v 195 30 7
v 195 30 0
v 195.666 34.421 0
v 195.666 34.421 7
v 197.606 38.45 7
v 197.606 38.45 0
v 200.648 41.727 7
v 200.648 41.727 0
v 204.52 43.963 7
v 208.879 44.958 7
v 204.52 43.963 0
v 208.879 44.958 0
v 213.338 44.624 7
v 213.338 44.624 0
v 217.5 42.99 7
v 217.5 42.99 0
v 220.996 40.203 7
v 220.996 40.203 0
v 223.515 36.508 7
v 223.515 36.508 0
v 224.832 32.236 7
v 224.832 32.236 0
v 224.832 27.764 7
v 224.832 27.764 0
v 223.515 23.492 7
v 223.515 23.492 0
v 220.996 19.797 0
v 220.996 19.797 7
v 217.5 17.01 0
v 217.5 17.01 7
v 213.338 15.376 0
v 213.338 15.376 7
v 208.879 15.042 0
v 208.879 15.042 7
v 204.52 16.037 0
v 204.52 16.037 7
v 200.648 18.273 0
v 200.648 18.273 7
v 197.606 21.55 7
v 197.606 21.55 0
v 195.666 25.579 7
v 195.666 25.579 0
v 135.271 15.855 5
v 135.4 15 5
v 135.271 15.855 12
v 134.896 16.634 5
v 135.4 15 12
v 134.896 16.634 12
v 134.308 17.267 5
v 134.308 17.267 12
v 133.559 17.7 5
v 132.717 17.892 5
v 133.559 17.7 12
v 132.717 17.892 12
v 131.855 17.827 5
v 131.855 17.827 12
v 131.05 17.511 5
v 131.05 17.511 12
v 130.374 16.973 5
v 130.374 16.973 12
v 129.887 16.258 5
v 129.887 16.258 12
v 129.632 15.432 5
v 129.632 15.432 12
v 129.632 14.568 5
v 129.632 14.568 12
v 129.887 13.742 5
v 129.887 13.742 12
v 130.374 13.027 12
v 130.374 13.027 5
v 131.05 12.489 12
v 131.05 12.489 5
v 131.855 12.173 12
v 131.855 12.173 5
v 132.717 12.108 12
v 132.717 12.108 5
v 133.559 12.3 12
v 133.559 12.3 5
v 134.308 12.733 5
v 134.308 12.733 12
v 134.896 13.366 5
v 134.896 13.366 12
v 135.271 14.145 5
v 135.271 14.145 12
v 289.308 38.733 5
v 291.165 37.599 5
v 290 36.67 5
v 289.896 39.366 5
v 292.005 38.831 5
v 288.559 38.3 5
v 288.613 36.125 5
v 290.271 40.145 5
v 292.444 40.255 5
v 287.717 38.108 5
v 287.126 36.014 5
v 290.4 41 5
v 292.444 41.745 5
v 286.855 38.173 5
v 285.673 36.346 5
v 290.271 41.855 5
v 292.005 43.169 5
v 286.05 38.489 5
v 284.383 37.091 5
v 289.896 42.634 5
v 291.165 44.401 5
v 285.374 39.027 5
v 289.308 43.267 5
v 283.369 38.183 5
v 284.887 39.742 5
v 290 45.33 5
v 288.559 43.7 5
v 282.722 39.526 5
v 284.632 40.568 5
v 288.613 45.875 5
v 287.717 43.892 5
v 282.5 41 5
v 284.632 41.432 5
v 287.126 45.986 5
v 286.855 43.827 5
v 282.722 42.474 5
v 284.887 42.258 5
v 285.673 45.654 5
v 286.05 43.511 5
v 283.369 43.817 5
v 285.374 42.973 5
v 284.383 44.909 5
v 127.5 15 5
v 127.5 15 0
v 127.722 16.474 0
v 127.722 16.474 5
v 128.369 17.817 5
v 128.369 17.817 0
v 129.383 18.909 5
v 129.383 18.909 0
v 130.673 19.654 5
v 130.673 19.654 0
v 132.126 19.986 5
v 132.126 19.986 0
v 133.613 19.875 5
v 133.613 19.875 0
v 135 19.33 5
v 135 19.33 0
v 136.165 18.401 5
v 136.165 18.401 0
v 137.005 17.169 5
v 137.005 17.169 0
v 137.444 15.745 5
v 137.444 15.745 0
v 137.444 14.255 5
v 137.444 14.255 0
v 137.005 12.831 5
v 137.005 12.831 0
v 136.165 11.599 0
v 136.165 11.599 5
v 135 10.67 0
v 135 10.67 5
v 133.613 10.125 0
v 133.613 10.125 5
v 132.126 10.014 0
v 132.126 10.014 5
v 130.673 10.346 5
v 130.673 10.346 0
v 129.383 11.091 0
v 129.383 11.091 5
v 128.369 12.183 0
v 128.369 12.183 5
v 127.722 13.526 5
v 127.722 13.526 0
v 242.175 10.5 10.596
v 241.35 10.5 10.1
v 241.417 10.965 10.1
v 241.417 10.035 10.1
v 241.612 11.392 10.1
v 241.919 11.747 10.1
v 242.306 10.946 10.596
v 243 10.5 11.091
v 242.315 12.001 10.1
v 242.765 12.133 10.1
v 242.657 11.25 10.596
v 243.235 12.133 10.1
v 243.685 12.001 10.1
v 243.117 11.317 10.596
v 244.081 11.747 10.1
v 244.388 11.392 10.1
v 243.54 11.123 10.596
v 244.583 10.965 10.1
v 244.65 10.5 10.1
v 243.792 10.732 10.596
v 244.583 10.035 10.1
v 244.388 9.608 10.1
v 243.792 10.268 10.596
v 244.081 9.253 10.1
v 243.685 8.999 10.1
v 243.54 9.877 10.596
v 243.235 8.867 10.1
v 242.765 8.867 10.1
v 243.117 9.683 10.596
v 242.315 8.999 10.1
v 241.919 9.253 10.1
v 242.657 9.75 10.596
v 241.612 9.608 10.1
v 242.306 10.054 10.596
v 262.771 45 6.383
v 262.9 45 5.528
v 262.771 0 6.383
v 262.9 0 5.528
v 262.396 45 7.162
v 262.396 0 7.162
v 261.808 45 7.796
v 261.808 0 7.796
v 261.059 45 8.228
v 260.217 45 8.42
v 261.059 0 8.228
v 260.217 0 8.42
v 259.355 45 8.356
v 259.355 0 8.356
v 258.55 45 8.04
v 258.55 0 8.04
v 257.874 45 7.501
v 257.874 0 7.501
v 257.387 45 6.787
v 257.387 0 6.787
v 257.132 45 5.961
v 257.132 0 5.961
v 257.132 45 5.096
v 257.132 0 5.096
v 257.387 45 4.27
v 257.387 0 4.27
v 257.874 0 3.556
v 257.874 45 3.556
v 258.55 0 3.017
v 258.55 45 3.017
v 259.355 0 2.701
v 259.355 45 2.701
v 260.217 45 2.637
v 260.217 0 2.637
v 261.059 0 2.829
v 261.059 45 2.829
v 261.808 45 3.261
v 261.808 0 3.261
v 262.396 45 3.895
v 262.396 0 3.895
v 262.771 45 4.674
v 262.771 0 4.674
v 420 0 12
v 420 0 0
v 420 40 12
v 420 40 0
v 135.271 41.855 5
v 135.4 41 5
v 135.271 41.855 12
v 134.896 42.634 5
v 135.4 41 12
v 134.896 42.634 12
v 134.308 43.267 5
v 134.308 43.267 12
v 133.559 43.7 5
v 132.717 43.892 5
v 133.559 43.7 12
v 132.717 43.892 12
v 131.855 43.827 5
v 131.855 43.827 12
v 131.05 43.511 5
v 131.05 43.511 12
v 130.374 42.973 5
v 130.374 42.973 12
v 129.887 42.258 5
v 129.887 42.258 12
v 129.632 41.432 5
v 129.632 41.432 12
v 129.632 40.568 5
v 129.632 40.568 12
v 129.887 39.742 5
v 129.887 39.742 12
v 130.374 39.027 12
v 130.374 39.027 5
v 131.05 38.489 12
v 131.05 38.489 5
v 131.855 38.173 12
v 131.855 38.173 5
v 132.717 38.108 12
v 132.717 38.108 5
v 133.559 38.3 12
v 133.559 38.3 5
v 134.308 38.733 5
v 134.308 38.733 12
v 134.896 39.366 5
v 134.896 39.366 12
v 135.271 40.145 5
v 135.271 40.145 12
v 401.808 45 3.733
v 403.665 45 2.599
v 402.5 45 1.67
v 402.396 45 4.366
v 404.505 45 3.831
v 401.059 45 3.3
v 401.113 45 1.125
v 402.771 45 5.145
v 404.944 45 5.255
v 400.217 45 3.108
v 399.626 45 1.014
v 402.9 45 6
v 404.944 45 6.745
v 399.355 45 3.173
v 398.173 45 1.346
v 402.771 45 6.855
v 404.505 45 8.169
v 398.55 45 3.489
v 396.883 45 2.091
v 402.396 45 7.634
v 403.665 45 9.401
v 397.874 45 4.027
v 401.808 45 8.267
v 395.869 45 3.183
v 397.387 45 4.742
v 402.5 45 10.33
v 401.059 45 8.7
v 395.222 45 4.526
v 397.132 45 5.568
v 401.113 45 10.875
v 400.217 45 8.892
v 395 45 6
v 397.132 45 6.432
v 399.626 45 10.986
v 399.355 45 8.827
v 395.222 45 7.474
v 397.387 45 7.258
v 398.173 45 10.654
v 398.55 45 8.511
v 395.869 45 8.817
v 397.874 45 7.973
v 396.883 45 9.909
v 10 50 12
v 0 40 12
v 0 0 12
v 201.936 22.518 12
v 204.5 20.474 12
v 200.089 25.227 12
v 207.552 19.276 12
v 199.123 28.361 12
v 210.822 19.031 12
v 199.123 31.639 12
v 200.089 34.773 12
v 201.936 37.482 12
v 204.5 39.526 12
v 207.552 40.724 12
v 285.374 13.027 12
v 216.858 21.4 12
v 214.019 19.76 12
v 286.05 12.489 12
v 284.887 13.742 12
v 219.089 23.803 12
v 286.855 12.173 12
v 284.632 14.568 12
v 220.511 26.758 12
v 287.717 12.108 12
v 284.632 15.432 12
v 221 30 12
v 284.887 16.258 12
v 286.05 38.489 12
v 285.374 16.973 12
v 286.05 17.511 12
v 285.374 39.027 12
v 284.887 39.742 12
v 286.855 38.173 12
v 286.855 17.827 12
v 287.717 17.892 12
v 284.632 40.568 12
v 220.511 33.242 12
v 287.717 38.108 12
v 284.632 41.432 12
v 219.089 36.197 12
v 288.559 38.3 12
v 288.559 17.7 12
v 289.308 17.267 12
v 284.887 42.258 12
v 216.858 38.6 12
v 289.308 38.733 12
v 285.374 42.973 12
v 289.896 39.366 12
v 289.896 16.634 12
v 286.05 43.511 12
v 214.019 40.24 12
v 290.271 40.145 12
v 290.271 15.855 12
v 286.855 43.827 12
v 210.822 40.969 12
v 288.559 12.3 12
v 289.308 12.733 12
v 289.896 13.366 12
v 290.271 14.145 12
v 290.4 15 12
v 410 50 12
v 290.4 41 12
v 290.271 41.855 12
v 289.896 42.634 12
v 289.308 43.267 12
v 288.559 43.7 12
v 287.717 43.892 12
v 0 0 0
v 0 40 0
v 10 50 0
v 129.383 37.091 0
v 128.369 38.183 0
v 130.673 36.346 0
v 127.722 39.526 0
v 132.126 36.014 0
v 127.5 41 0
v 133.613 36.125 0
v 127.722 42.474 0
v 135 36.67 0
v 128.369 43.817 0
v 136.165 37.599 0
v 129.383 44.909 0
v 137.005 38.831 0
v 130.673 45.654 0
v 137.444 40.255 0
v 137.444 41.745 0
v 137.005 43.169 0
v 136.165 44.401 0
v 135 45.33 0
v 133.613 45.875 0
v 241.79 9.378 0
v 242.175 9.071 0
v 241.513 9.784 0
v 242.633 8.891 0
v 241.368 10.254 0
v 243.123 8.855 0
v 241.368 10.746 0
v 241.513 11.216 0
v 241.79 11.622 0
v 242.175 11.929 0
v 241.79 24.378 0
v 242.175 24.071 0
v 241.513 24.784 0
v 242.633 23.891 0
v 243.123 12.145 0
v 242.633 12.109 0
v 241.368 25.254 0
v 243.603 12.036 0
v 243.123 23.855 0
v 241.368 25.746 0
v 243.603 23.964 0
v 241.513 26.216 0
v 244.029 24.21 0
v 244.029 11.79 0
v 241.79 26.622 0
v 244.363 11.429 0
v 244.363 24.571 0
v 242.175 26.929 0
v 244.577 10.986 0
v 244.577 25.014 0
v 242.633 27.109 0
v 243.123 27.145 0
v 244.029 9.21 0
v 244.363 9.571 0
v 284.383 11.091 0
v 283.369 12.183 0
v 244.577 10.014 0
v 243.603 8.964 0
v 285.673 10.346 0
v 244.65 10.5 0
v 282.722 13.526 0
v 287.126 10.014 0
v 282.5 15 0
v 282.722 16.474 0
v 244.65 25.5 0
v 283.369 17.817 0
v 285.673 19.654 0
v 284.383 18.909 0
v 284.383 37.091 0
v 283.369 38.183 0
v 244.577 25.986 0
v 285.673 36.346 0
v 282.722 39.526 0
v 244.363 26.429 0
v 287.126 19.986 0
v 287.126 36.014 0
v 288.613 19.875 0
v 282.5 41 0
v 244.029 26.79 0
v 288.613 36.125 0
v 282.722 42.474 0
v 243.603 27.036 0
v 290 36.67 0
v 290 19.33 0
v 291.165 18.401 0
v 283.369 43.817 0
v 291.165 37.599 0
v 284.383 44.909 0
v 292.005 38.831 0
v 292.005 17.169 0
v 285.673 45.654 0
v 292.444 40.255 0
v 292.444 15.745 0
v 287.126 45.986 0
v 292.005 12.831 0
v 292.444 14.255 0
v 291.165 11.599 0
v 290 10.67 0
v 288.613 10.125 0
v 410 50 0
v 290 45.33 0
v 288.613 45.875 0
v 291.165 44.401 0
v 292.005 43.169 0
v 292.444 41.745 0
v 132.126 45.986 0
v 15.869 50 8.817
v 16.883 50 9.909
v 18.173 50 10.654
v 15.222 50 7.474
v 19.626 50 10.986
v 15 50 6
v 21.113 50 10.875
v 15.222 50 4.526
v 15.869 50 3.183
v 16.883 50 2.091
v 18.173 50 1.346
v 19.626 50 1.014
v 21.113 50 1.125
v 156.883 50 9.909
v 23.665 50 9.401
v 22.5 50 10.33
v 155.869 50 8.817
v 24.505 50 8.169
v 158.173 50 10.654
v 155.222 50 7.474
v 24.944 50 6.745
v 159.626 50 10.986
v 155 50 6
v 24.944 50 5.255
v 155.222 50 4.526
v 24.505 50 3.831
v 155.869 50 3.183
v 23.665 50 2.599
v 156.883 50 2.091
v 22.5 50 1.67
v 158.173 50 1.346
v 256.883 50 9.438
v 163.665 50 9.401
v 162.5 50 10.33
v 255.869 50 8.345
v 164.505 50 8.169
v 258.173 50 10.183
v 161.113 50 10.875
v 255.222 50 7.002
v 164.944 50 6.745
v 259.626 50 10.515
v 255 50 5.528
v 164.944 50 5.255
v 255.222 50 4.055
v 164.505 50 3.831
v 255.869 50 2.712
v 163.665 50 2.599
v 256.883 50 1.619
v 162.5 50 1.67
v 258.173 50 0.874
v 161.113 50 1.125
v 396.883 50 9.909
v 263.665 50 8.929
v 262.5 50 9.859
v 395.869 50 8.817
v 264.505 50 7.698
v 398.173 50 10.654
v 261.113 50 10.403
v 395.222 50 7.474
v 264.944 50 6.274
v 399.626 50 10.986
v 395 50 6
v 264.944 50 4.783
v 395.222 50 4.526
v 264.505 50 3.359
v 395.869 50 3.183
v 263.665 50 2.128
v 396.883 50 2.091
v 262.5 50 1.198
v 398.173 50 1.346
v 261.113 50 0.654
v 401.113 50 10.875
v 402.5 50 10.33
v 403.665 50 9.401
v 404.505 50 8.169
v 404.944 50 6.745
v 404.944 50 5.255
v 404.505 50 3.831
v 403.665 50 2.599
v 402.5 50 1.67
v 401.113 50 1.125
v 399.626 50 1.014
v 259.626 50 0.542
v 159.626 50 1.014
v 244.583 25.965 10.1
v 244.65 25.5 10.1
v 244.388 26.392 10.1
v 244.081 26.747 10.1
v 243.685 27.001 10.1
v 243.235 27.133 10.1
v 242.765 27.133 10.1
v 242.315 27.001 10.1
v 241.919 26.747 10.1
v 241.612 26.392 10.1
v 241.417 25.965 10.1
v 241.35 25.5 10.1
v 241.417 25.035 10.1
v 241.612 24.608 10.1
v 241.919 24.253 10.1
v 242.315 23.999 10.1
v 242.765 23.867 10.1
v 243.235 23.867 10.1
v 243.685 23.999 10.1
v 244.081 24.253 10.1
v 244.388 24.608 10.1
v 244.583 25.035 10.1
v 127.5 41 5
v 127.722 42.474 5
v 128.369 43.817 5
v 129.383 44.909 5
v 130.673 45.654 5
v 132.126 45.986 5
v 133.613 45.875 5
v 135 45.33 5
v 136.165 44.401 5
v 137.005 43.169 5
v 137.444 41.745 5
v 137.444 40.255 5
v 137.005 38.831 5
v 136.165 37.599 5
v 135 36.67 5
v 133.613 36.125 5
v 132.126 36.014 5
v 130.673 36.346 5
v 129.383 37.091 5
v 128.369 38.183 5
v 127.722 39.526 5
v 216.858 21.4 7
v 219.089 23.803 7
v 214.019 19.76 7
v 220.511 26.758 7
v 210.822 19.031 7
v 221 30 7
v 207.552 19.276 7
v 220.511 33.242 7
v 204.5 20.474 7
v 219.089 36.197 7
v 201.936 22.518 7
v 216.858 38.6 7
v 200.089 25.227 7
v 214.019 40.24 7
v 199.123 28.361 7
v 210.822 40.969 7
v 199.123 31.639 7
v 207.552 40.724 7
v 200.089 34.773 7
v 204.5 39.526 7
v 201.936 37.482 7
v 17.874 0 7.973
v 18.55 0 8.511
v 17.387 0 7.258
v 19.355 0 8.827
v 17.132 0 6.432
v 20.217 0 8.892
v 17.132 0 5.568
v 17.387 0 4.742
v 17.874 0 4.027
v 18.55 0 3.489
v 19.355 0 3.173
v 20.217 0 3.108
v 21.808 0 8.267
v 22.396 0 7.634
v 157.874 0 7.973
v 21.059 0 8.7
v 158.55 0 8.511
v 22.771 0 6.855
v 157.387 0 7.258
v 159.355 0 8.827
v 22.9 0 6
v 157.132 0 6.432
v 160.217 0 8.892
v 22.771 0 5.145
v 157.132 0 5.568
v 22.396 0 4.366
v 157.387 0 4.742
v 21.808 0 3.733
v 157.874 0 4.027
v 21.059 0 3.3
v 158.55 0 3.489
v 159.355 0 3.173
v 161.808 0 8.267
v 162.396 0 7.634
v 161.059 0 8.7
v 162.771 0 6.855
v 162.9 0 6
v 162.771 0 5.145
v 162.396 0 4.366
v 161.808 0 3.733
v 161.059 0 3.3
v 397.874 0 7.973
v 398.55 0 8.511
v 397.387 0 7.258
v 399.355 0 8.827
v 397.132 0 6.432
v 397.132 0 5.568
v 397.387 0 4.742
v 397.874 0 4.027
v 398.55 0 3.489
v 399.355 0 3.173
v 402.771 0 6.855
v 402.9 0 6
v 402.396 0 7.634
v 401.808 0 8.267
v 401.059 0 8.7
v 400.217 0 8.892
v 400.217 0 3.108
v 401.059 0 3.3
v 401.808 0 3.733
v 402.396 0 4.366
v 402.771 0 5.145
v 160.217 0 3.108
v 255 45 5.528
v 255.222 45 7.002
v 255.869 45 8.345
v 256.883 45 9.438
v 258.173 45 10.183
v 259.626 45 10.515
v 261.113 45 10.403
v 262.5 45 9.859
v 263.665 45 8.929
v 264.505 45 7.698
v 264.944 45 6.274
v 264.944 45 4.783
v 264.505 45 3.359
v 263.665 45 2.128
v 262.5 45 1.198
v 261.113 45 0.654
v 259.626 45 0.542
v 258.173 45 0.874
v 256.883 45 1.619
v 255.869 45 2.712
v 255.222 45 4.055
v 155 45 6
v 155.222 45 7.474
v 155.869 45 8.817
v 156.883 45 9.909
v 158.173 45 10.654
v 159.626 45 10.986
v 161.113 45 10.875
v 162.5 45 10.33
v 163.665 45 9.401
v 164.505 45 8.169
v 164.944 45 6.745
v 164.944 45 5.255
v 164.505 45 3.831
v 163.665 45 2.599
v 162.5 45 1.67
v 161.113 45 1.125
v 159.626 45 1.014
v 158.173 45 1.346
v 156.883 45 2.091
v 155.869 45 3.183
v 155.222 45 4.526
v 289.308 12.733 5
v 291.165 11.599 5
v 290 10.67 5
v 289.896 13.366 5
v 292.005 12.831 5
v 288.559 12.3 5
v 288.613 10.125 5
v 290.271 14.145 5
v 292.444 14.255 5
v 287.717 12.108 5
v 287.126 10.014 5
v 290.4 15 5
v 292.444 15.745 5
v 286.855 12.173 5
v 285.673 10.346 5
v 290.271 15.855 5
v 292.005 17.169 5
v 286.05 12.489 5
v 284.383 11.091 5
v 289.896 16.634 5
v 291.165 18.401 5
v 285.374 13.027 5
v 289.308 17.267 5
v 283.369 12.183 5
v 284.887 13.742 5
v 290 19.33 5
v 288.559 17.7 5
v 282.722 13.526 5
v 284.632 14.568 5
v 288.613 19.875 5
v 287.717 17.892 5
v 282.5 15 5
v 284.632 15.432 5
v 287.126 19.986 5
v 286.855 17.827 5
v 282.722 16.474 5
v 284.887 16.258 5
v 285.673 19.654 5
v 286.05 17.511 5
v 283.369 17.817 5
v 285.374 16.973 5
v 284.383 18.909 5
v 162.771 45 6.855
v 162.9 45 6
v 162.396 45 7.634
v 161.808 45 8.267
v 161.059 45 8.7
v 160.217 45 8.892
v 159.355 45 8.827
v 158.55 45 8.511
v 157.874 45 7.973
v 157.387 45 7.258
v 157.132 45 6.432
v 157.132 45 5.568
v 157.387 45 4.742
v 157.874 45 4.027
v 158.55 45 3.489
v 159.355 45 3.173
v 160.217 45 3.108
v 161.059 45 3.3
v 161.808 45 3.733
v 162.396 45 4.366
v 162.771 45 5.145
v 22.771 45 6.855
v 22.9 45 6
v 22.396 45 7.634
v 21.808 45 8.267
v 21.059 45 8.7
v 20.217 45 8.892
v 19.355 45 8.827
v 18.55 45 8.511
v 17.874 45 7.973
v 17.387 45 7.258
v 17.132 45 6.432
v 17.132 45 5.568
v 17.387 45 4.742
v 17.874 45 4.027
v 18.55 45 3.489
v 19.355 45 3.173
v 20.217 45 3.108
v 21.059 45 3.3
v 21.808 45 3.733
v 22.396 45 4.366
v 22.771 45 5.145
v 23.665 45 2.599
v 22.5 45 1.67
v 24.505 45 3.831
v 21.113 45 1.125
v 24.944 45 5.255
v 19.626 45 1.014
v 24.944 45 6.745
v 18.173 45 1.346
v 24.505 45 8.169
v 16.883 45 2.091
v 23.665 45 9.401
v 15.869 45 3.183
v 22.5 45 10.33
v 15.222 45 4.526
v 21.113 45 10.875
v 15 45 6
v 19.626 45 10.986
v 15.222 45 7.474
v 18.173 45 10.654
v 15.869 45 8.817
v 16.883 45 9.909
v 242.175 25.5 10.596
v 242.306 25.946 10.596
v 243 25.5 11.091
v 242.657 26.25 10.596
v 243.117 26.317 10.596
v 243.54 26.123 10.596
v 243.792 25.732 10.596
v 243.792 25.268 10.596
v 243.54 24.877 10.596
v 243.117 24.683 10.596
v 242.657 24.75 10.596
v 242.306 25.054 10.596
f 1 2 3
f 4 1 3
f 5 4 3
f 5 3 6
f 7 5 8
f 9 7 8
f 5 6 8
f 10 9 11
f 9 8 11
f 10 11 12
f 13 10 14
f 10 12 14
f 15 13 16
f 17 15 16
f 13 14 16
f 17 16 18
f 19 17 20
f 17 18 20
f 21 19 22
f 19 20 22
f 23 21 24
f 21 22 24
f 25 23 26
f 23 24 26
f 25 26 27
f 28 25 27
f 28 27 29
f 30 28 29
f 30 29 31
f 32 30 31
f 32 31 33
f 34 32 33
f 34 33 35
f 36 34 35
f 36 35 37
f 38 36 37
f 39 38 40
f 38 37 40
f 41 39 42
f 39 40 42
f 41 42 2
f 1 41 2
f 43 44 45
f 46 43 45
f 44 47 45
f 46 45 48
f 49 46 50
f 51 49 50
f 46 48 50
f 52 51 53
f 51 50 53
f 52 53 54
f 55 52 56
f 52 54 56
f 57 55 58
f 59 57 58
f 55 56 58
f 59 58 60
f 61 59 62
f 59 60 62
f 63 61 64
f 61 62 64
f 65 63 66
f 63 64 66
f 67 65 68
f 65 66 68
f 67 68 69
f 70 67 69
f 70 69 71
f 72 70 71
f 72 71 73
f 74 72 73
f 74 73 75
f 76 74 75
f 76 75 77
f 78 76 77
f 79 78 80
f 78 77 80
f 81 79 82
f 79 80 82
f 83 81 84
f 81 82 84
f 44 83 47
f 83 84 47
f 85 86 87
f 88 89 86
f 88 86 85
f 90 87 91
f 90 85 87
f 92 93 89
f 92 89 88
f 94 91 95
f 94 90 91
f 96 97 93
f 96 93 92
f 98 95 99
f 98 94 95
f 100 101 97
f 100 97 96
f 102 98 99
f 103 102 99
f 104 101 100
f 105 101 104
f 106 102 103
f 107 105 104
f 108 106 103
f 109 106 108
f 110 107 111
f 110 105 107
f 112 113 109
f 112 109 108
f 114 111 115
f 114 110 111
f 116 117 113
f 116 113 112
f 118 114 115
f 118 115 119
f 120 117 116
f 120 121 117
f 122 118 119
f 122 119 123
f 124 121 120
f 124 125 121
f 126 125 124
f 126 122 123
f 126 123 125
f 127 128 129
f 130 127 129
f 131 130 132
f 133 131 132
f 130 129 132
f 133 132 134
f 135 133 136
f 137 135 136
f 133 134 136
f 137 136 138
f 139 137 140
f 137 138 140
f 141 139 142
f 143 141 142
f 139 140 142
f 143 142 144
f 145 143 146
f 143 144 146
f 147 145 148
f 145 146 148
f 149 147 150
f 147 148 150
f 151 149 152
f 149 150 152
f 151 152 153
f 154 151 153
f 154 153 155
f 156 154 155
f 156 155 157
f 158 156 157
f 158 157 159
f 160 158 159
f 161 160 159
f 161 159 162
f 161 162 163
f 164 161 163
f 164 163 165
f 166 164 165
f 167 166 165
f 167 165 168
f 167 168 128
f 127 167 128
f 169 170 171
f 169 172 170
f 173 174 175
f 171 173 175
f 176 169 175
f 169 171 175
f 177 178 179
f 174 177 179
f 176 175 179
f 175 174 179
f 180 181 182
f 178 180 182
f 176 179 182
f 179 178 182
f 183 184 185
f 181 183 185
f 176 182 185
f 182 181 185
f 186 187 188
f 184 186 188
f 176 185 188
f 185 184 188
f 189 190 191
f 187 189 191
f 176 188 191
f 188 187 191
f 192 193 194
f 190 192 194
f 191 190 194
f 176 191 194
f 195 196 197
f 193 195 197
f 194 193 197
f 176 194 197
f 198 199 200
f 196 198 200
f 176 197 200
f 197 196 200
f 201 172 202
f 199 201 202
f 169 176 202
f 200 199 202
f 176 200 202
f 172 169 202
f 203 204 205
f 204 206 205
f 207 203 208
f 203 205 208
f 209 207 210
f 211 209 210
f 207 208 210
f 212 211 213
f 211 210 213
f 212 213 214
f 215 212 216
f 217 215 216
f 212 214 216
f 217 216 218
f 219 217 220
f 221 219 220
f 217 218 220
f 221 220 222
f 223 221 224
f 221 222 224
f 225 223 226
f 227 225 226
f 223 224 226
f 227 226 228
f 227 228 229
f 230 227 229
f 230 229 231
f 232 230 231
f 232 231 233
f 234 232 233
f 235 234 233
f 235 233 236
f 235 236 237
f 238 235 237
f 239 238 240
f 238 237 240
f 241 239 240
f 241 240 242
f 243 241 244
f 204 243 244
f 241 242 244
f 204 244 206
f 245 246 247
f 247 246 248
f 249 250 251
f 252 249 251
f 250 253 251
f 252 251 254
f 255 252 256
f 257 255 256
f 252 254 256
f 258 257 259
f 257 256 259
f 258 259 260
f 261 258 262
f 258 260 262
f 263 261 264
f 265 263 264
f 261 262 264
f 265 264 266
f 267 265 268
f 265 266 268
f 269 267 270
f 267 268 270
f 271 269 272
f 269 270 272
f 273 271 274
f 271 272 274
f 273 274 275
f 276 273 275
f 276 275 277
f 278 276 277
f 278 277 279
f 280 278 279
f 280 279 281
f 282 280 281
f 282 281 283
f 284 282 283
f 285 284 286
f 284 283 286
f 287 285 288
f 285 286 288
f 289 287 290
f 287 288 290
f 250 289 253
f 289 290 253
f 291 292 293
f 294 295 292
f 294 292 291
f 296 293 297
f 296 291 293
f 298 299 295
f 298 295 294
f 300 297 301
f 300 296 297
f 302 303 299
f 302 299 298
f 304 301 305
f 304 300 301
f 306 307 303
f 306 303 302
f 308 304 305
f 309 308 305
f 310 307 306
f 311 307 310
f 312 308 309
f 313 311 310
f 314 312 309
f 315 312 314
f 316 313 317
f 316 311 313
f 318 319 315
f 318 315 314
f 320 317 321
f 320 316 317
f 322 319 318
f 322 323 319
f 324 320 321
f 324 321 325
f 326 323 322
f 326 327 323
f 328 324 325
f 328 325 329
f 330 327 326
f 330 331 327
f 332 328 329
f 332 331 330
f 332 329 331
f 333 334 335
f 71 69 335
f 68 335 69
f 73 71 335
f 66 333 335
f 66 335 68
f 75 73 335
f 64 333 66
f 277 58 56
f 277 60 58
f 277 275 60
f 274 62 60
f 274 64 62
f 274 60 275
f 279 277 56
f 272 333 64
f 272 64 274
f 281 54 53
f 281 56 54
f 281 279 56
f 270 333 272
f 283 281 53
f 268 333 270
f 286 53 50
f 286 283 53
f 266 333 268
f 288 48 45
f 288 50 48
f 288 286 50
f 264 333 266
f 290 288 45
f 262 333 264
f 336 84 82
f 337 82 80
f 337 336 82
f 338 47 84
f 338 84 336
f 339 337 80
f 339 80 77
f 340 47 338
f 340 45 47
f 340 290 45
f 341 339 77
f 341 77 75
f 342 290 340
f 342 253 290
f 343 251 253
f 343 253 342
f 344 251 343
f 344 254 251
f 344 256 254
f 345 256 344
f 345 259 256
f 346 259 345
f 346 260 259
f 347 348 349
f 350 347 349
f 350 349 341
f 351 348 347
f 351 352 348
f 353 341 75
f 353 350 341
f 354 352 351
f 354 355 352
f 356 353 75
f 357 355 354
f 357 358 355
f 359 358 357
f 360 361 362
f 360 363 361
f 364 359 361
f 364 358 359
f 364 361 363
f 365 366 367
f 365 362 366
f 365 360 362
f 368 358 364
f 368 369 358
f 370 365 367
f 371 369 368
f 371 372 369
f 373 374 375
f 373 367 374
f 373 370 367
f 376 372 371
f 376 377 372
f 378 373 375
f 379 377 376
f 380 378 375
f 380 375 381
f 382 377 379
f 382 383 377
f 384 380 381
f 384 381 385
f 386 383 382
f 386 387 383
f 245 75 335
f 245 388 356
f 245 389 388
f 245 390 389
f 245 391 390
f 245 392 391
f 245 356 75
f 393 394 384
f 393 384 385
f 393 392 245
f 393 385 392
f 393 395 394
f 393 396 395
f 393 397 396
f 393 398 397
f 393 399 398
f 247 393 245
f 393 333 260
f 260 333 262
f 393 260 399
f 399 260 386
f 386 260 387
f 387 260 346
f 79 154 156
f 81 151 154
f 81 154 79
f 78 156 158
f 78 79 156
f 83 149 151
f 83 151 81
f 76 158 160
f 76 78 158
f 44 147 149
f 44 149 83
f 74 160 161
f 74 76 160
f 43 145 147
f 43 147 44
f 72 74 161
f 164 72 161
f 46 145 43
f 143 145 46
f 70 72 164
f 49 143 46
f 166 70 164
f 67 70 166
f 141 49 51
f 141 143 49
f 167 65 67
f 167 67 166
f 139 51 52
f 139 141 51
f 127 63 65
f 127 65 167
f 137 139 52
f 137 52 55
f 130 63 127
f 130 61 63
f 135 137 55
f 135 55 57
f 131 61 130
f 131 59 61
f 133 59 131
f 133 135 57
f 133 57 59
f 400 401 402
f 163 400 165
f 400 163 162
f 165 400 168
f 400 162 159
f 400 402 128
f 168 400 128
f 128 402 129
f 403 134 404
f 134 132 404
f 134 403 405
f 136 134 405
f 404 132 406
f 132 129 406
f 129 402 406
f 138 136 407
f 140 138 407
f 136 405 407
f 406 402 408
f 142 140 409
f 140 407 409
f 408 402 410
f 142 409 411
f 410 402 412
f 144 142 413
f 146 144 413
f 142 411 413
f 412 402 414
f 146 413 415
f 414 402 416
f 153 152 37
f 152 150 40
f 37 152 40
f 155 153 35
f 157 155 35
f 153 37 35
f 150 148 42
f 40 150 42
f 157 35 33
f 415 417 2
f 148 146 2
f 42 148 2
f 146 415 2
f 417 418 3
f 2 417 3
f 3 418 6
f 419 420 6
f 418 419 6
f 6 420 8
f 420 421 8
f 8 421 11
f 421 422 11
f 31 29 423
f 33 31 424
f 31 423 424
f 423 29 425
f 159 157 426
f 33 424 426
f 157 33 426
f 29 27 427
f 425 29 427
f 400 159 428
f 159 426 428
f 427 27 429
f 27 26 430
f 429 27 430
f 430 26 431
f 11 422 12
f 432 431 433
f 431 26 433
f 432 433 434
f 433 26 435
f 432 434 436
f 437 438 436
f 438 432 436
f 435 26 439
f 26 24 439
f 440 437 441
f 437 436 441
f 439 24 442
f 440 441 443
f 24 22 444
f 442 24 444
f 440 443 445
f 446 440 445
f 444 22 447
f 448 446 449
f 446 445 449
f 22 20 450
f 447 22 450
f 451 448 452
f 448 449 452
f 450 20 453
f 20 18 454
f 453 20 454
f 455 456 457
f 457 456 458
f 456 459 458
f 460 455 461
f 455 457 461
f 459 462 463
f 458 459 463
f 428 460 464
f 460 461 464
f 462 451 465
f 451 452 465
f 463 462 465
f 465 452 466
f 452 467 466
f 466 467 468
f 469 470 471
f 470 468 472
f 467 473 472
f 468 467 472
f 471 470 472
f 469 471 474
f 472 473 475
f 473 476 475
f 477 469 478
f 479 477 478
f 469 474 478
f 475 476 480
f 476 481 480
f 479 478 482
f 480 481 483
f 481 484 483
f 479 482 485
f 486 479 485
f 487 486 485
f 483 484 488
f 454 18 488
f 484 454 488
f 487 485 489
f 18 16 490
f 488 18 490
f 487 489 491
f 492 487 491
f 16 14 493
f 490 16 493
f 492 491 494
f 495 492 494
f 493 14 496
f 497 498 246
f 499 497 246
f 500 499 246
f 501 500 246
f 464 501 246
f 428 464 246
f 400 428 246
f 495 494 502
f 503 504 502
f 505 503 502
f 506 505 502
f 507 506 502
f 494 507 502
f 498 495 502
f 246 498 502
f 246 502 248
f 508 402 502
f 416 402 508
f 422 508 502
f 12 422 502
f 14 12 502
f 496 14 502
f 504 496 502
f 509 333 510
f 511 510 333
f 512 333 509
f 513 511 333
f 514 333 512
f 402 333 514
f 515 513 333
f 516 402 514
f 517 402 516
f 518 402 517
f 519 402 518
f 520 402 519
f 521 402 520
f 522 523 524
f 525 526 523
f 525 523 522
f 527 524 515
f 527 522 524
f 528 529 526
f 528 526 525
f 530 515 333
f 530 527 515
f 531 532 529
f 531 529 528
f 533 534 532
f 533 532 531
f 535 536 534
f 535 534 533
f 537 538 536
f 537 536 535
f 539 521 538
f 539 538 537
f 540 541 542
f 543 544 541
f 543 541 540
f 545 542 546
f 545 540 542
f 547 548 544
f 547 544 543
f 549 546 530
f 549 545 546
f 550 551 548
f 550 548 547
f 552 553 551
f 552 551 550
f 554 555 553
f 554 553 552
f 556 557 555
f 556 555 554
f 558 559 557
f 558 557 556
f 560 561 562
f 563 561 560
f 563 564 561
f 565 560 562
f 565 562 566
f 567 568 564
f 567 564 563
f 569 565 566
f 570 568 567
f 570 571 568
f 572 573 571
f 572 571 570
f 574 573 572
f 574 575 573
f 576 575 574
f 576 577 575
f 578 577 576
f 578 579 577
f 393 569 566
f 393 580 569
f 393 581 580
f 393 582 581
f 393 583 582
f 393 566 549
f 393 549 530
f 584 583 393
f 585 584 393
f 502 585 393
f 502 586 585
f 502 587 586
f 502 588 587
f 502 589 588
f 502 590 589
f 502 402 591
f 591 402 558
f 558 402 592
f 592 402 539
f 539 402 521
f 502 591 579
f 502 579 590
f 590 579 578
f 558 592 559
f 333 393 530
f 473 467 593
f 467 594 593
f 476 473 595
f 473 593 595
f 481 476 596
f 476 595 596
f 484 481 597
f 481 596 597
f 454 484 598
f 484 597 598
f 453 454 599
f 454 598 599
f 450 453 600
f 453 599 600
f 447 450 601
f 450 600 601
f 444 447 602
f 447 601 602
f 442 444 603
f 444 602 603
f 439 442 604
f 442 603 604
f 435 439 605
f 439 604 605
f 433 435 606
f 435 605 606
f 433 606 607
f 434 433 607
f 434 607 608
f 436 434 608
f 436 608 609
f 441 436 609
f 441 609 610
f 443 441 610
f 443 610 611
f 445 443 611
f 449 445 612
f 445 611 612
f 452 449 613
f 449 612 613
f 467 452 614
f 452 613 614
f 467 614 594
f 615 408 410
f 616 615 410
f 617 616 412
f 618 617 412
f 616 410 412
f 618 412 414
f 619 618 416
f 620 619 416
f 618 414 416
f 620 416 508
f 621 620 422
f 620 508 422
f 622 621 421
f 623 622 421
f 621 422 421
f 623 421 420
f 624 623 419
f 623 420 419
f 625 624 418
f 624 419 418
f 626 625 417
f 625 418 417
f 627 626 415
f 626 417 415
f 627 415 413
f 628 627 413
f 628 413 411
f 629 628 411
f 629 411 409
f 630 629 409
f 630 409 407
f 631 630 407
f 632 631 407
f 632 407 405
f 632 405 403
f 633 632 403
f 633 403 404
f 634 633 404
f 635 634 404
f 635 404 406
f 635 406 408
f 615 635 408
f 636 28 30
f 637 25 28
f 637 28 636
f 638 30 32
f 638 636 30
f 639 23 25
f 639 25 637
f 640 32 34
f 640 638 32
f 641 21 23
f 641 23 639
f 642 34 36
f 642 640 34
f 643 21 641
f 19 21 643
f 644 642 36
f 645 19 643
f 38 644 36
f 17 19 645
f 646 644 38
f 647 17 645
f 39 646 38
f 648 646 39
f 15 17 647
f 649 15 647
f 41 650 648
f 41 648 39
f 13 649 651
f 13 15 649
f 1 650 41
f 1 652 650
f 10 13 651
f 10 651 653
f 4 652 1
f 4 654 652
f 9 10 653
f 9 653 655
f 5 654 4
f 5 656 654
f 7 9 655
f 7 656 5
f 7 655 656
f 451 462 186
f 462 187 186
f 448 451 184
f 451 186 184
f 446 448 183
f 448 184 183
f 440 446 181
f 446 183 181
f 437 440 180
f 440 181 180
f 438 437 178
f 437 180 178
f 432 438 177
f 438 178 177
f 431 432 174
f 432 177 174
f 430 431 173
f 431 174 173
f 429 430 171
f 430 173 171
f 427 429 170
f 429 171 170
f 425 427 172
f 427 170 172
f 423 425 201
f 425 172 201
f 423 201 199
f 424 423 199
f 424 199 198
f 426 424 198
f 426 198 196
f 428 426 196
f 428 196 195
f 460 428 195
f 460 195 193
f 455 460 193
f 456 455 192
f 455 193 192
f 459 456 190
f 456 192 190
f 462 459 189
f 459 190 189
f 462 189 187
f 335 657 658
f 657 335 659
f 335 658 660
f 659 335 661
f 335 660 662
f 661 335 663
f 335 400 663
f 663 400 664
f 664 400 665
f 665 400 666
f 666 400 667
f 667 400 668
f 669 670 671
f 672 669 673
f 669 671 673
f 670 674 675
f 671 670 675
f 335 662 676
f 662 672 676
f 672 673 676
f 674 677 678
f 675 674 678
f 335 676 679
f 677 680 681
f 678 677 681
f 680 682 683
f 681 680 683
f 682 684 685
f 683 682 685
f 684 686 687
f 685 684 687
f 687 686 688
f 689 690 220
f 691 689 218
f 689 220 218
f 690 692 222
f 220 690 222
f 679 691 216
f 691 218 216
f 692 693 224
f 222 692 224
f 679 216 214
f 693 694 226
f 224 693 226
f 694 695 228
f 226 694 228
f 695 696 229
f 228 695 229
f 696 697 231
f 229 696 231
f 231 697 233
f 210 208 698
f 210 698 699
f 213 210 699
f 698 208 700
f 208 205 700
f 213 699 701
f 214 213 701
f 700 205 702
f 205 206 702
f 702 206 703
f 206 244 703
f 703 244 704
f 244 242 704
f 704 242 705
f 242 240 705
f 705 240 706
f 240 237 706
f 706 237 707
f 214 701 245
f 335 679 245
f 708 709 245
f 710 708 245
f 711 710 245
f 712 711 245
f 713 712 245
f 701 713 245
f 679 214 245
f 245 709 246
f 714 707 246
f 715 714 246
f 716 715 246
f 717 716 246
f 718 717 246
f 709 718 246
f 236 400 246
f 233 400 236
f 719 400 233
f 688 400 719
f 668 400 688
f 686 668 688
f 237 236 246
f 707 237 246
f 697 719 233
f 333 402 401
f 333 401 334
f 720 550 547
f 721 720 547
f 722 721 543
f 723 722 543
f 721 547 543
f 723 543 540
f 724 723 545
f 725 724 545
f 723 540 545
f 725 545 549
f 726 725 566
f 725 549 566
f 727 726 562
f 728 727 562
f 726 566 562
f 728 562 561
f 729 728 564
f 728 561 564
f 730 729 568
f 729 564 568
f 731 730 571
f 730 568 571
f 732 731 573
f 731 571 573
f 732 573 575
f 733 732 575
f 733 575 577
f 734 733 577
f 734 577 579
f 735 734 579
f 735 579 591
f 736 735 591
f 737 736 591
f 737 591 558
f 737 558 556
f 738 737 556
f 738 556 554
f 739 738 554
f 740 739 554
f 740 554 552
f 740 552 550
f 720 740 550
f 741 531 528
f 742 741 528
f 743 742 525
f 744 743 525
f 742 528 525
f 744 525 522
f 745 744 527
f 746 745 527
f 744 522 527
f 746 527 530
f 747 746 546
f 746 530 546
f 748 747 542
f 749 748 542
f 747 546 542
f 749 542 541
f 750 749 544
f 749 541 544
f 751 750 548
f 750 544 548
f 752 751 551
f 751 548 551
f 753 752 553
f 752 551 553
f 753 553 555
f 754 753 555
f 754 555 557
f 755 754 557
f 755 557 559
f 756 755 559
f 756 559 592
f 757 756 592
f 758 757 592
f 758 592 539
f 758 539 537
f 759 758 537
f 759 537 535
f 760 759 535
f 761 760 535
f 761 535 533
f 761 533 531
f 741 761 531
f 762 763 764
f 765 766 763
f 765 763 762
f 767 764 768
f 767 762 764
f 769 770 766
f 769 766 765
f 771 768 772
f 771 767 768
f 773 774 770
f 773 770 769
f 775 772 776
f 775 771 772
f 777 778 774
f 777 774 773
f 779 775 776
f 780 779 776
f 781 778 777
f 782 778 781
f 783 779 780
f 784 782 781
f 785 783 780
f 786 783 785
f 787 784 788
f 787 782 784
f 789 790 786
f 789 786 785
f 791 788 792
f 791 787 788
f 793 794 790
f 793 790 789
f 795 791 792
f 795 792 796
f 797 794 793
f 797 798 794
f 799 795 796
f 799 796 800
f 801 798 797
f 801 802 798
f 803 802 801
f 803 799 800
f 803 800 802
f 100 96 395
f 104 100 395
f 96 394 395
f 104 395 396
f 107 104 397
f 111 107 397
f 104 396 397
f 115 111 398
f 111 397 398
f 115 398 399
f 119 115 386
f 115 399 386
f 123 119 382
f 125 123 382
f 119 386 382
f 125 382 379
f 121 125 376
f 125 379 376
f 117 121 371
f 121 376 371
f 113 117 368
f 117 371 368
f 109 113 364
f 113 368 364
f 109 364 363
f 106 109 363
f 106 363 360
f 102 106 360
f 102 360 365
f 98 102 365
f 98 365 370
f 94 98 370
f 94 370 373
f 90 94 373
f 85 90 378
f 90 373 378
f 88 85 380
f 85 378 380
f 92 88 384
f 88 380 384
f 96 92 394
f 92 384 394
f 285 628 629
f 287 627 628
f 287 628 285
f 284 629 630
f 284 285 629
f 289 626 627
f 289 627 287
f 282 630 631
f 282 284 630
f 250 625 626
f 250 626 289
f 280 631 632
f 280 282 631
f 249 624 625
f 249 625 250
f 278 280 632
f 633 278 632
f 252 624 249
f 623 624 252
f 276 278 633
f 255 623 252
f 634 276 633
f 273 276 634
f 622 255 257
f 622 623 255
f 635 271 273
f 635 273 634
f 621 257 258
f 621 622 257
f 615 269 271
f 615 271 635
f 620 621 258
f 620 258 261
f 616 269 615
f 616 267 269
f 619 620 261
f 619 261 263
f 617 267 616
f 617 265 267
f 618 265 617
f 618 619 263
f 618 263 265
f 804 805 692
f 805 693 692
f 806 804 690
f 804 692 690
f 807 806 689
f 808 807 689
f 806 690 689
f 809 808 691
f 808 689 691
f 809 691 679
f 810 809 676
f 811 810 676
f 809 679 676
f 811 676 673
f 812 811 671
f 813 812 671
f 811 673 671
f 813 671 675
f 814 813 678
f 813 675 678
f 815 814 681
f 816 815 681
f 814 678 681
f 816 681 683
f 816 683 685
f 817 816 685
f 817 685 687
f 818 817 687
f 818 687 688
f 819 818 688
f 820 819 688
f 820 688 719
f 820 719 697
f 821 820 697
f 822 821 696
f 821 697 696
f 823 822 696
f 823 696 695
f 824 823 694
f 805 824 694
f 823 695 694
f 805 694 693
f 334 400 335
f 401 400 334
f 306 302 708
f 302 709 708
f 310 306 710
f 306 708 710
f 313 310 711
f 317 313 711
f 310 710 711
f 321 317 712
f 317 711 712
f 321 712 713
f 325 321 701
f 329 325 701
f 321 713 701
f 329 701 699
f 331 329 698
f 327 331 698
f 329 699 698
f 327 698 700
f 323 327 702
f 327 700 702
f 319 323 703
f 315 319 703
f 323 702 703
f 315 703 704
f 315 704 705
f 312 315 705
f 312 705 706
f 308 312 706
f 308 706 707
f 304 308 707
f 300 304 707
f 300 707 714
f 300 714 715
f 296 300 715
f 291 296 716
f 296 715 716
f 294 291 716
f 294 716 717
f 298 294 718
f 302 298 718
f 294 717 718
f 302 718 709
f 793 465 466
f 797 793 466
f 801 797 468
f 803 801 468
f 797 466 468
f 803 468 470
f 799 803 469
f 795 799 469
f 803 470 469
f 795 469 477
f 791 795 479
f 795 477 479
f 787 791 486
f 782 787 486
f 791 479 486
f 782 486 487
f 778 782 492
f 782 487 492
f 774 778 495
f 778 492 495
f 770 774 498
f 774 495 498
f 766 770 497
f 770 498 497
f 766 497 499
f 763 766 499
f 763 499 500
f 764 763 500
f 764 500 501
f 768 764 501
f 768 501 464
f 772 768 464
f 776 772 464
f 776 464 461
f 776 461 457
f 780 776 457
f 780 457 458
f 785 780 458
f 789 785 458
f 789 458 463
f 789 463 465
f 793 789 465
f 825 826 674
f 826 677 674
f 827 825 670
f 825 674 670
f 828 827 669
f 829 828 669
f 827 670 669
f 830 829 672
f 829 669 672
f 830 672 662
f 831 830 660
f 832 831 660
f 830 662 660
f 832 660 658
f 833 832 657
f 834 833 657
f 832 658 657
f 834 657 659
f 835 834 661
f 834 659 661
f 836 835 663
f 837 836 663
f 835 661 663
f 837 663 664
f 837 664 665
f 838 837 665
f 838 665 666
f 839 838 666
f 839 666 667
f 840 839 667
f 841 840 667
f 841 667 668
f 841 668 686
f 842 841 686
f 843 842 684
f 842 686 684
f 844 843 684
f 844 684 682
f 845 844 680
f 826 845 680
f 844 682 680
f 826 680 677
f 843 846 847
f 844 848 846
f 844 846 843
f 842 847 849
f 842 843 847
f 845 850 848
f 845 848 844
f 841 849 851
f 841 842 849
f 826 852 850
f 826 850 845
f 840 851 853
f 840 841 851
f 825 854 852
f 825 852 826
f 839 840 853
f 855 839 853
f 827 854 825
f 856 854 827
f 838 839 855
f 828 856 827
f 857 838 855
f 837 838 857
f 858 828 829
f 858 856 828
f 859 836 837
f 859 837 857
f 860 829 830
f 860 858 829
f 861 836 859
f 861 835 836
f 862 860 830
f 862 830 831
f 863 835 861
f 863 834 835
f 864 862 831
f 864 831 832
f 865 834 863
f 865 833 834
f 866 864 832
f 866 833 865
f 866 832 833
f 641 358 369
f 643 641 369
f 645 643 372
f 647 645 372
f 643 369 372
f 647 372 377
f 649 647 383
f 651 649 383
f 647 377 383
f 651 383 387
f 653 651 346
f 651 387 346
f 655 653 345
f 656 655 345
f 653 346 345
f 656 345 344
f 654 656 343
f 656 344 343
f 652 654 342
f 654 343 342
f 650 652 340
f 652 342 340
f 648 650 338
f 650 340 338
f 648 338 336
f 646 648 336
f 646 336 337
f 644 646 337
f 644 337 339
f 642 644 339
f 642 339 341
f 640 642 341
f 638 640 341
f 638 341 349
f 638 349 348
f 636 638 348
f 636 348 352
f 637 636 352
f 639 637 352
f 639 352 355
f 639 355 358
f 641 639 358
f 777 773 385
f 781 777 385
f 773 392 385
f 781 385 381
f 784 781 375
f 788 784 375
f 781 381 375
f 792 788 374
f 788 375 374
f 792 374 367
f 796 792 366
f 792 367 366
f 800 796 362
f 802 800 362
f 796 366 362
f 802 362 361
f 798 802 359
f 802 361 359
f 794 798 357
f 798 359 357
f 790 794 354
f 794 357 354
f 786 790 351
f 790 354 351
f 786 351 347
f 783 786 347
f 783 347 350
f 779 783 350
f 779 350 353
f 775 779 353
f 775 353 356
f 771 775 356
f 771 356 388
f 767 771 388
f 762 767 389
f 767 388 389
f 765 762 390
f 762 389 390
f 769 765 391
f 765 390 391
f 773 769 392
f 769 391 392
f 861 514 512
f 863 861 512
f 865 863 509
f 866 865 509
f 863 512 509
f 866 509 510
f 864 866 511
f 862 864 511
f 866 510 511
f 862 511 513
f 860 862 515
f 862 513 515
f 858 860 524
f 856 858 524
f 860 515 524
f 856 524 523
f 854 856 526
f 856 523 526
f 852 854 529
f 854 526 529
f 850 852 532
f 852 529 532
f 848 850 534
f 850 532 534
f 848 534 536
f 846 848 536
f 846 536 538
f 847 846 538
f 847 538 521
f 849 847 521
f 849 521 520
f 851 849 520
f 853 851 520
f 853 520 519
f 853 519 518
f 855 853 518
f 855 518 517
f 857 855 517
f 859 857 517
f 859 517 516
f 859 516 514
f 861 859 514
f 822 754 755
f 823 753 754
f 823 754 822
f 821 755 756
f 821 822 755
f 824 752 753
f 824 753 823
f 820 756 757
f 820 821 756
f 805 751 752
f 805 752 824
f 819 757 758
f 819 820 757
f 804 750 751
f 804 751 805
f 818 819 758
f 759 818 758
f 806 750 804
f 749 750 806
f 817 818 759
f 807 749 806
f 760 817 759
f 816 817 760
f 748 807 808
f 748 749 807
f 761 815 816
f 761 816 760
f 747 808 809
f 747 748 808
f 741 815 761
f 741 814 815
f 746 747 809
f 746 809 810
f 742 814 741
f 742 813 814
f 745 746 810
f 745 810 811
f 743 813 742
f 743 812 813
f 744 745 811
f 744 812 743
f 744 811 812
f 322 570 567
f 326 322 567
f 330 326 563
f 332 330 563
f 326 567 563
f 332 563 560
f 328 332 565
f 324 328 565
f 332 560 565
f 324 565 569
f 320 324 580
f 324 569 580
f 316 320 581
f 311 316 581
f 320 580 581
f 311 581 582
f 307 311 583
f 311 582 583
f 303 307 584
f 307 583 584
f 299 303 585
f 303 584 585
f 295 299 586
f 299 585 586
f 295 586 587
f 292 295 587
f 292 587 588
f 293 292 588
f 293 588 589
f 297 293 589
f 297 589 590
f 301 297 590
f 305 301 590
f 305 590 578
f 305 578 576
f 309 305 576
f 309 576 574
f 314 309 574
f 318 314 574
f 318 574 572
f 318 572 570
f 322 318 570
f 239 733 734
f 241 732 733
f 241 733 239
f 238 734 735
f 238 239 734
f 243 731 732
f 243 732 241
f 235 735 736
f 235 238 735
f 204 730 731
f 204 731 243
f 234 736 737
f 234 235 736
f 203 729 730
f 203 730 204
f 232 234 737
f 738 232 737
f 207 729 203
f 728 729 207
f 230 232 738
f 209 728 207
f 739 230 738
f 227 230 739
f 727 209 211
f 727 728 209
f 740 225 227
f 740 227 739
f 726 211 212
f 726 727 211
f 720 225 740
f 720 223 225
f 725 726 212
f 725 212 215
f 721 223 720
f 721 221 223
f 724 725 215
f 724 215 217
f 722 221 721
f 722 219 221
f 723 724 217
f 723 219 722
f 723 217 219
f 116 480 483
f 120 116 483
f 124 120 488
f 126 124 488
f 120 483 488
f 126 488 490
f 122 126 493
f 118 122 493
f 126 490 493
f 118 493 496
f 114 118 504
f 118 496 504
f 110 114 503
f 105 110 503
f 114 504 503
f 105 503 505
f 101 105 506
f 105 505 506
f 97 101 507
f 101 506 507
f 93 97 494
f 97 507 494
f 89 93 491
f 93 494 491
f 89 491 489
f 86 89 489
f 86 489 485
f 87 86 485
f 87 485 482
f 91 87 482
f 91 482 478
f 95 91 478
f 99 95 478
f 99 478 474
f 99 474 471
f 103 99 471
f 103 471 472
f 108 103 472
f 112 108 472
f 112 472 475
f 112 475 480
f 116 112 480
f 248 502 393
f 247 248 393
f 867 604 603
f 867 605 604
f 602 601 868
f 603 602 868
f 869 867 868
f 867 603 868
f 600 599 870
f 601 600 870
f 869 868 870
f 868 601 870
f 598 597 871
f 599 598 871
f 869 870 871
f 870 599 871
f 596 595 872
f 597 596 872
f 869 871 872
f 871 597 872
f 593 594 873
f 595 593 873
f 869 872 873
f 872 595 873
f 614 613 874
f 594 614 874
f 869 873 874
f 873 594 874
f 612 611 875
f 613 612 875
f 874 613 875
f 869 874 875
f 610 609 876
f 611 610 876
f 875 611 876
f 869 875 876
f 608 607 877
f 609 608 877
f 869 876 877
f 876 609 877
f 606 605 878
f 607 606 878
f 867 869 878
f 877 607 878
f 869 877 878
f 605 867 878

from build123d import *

# Parameters (mm, degrees)
SKETCH_1_W                   = 420
SKETCH_1_H                   = 50
EXTRUDE_1_DEPTH              = 12
CHAMFER_1_SIZE               = 10
SKETCH_2_R                   = 11
CUT_EXTRUDE_1_DEPTH          = 424.135911972
SKETCH_3_R                   = 15
CUT_EXTRUDE_2_DEPTH          = 7
HOLE_WIZARD_M5_1_D           = 5.8
HOLE_WIZARD_M5_1_CBORE_D     = 10
HOLE_WIZARD_M5_1_CBORE_DEPTH = 5
HOLE_WIZARD_M5_2_D           = 5.8
HOLE_WIZARD_M5_2_CBORE_D     = 10
HOLE_WIZARD_M5_2_CBORE_DEPTH = 5
HOLE_WIZARD_M4_1_D           = 3.3
HOLE_WIZARD_M4_1_DEPTH       = 10.1
HOLE_WIZARD_M4_1_TIP         = 0.991420021


with BuildPart() as part:
    # 草图1 → 凸台-拉伸1 (new body)
    with BuildSketch(Plane.XY):
        with Locations((210, 25)):
            Rectangle(SKETCH_1_W, SKETCH_1_H)
    extrude(amount=EXTRUDE_1_DEPTH)

    # 倒角1
    chamfer_1_edges = [part.edges().sort_by_distance(p)[0] for p in [
        (0, 50, 6),
        (420, 50, 6),
    ]]
    chamfer(chamfer_1_edges, length=CHAMFER_1_SIZE)

    # 草图2 → 切除-拉伸1 (cut, through all)
    with BuildSketch(Plane.XY.offset(12)):
        with Locations((210, 30)):
            Circle(SKETCH_2_R)
    extrude(amount=-CUT_EXTRUDE_1_DEPTH, mode=Mode.SUBTRACT)

    # 草图3 → 切除-拉伸2 (cut)
    with BuildSketch(Plane(origin=(0, 0, 0), x_dir=(-1, 0, 0), z_dir=(0, 0, -1))):
        with Locations((-210, 30)):
            Circle(SKETCH_3_R)
    extrude(amount=-CUT_EXTRUDE_2_DEPTH, mode=Mode.SUBTRACT)

    # M5 六角凹头螺钉的柱形沉头孔1 (through all)
    with Locations(Plane(origin=(0, 50, 0), x_dir=(-1, 0, 0), z_dir=(0, 1, 0))):
        with Locations((-20, 6), (-160, 6), (-260, 5.528486678), (-400, 6)):
            CounterBoreHole(HOLE_WIZARD_M5_1_D / 2, HOLE_WIZARD_M5_1_CBORE_D / 2, HOLE_WIZARD_M5_1_CBORE_DEPTH)

    # M5 六角凹头螺钉的柱形沉头孔2 (through all)
    with Locations(Plane(origin=(0, 0, 0), x_dir=(-1, 0, 0), z_dir=(0, 0, -1))):
        with Locations((-287.5, 41), (-287.5, 15), (-132.5, 41), (-132.5, 15)):
            CounterBoreHole(HOLE_WIZARD_M5_2_D / 2, HOLE_WIZARD_M5_2_CBORE_D / 2, HOLE_WIZARD_M5_2_CBORE_DEPTH)

    # M4 螺纹孔1
    with Locations(Plane(origin=(0, 0, 0), x_dir=(-1, 0, 0), z_dir=(0, 0, -1))):
        with Locations((-243, 25.5), (-243, 10.5)):
            Hole(HOLE_WIZARD_M4_1_D / 2, depth=HOLE_WIZARD_M4_1_DEPTH)
            with Locations((0, 0, -(HOLE_WIZARD_M4_1_DEPTH + HOLE_WIZARD_M4_1_TIP / 2))):  # 118° drill point
                Cone(0, HOLE_WIZARD_M4_1_D / 2, HOLE_WIZARD_M4_1_TIP, mode=Mode.SUBTRACT)


solid = part.part
